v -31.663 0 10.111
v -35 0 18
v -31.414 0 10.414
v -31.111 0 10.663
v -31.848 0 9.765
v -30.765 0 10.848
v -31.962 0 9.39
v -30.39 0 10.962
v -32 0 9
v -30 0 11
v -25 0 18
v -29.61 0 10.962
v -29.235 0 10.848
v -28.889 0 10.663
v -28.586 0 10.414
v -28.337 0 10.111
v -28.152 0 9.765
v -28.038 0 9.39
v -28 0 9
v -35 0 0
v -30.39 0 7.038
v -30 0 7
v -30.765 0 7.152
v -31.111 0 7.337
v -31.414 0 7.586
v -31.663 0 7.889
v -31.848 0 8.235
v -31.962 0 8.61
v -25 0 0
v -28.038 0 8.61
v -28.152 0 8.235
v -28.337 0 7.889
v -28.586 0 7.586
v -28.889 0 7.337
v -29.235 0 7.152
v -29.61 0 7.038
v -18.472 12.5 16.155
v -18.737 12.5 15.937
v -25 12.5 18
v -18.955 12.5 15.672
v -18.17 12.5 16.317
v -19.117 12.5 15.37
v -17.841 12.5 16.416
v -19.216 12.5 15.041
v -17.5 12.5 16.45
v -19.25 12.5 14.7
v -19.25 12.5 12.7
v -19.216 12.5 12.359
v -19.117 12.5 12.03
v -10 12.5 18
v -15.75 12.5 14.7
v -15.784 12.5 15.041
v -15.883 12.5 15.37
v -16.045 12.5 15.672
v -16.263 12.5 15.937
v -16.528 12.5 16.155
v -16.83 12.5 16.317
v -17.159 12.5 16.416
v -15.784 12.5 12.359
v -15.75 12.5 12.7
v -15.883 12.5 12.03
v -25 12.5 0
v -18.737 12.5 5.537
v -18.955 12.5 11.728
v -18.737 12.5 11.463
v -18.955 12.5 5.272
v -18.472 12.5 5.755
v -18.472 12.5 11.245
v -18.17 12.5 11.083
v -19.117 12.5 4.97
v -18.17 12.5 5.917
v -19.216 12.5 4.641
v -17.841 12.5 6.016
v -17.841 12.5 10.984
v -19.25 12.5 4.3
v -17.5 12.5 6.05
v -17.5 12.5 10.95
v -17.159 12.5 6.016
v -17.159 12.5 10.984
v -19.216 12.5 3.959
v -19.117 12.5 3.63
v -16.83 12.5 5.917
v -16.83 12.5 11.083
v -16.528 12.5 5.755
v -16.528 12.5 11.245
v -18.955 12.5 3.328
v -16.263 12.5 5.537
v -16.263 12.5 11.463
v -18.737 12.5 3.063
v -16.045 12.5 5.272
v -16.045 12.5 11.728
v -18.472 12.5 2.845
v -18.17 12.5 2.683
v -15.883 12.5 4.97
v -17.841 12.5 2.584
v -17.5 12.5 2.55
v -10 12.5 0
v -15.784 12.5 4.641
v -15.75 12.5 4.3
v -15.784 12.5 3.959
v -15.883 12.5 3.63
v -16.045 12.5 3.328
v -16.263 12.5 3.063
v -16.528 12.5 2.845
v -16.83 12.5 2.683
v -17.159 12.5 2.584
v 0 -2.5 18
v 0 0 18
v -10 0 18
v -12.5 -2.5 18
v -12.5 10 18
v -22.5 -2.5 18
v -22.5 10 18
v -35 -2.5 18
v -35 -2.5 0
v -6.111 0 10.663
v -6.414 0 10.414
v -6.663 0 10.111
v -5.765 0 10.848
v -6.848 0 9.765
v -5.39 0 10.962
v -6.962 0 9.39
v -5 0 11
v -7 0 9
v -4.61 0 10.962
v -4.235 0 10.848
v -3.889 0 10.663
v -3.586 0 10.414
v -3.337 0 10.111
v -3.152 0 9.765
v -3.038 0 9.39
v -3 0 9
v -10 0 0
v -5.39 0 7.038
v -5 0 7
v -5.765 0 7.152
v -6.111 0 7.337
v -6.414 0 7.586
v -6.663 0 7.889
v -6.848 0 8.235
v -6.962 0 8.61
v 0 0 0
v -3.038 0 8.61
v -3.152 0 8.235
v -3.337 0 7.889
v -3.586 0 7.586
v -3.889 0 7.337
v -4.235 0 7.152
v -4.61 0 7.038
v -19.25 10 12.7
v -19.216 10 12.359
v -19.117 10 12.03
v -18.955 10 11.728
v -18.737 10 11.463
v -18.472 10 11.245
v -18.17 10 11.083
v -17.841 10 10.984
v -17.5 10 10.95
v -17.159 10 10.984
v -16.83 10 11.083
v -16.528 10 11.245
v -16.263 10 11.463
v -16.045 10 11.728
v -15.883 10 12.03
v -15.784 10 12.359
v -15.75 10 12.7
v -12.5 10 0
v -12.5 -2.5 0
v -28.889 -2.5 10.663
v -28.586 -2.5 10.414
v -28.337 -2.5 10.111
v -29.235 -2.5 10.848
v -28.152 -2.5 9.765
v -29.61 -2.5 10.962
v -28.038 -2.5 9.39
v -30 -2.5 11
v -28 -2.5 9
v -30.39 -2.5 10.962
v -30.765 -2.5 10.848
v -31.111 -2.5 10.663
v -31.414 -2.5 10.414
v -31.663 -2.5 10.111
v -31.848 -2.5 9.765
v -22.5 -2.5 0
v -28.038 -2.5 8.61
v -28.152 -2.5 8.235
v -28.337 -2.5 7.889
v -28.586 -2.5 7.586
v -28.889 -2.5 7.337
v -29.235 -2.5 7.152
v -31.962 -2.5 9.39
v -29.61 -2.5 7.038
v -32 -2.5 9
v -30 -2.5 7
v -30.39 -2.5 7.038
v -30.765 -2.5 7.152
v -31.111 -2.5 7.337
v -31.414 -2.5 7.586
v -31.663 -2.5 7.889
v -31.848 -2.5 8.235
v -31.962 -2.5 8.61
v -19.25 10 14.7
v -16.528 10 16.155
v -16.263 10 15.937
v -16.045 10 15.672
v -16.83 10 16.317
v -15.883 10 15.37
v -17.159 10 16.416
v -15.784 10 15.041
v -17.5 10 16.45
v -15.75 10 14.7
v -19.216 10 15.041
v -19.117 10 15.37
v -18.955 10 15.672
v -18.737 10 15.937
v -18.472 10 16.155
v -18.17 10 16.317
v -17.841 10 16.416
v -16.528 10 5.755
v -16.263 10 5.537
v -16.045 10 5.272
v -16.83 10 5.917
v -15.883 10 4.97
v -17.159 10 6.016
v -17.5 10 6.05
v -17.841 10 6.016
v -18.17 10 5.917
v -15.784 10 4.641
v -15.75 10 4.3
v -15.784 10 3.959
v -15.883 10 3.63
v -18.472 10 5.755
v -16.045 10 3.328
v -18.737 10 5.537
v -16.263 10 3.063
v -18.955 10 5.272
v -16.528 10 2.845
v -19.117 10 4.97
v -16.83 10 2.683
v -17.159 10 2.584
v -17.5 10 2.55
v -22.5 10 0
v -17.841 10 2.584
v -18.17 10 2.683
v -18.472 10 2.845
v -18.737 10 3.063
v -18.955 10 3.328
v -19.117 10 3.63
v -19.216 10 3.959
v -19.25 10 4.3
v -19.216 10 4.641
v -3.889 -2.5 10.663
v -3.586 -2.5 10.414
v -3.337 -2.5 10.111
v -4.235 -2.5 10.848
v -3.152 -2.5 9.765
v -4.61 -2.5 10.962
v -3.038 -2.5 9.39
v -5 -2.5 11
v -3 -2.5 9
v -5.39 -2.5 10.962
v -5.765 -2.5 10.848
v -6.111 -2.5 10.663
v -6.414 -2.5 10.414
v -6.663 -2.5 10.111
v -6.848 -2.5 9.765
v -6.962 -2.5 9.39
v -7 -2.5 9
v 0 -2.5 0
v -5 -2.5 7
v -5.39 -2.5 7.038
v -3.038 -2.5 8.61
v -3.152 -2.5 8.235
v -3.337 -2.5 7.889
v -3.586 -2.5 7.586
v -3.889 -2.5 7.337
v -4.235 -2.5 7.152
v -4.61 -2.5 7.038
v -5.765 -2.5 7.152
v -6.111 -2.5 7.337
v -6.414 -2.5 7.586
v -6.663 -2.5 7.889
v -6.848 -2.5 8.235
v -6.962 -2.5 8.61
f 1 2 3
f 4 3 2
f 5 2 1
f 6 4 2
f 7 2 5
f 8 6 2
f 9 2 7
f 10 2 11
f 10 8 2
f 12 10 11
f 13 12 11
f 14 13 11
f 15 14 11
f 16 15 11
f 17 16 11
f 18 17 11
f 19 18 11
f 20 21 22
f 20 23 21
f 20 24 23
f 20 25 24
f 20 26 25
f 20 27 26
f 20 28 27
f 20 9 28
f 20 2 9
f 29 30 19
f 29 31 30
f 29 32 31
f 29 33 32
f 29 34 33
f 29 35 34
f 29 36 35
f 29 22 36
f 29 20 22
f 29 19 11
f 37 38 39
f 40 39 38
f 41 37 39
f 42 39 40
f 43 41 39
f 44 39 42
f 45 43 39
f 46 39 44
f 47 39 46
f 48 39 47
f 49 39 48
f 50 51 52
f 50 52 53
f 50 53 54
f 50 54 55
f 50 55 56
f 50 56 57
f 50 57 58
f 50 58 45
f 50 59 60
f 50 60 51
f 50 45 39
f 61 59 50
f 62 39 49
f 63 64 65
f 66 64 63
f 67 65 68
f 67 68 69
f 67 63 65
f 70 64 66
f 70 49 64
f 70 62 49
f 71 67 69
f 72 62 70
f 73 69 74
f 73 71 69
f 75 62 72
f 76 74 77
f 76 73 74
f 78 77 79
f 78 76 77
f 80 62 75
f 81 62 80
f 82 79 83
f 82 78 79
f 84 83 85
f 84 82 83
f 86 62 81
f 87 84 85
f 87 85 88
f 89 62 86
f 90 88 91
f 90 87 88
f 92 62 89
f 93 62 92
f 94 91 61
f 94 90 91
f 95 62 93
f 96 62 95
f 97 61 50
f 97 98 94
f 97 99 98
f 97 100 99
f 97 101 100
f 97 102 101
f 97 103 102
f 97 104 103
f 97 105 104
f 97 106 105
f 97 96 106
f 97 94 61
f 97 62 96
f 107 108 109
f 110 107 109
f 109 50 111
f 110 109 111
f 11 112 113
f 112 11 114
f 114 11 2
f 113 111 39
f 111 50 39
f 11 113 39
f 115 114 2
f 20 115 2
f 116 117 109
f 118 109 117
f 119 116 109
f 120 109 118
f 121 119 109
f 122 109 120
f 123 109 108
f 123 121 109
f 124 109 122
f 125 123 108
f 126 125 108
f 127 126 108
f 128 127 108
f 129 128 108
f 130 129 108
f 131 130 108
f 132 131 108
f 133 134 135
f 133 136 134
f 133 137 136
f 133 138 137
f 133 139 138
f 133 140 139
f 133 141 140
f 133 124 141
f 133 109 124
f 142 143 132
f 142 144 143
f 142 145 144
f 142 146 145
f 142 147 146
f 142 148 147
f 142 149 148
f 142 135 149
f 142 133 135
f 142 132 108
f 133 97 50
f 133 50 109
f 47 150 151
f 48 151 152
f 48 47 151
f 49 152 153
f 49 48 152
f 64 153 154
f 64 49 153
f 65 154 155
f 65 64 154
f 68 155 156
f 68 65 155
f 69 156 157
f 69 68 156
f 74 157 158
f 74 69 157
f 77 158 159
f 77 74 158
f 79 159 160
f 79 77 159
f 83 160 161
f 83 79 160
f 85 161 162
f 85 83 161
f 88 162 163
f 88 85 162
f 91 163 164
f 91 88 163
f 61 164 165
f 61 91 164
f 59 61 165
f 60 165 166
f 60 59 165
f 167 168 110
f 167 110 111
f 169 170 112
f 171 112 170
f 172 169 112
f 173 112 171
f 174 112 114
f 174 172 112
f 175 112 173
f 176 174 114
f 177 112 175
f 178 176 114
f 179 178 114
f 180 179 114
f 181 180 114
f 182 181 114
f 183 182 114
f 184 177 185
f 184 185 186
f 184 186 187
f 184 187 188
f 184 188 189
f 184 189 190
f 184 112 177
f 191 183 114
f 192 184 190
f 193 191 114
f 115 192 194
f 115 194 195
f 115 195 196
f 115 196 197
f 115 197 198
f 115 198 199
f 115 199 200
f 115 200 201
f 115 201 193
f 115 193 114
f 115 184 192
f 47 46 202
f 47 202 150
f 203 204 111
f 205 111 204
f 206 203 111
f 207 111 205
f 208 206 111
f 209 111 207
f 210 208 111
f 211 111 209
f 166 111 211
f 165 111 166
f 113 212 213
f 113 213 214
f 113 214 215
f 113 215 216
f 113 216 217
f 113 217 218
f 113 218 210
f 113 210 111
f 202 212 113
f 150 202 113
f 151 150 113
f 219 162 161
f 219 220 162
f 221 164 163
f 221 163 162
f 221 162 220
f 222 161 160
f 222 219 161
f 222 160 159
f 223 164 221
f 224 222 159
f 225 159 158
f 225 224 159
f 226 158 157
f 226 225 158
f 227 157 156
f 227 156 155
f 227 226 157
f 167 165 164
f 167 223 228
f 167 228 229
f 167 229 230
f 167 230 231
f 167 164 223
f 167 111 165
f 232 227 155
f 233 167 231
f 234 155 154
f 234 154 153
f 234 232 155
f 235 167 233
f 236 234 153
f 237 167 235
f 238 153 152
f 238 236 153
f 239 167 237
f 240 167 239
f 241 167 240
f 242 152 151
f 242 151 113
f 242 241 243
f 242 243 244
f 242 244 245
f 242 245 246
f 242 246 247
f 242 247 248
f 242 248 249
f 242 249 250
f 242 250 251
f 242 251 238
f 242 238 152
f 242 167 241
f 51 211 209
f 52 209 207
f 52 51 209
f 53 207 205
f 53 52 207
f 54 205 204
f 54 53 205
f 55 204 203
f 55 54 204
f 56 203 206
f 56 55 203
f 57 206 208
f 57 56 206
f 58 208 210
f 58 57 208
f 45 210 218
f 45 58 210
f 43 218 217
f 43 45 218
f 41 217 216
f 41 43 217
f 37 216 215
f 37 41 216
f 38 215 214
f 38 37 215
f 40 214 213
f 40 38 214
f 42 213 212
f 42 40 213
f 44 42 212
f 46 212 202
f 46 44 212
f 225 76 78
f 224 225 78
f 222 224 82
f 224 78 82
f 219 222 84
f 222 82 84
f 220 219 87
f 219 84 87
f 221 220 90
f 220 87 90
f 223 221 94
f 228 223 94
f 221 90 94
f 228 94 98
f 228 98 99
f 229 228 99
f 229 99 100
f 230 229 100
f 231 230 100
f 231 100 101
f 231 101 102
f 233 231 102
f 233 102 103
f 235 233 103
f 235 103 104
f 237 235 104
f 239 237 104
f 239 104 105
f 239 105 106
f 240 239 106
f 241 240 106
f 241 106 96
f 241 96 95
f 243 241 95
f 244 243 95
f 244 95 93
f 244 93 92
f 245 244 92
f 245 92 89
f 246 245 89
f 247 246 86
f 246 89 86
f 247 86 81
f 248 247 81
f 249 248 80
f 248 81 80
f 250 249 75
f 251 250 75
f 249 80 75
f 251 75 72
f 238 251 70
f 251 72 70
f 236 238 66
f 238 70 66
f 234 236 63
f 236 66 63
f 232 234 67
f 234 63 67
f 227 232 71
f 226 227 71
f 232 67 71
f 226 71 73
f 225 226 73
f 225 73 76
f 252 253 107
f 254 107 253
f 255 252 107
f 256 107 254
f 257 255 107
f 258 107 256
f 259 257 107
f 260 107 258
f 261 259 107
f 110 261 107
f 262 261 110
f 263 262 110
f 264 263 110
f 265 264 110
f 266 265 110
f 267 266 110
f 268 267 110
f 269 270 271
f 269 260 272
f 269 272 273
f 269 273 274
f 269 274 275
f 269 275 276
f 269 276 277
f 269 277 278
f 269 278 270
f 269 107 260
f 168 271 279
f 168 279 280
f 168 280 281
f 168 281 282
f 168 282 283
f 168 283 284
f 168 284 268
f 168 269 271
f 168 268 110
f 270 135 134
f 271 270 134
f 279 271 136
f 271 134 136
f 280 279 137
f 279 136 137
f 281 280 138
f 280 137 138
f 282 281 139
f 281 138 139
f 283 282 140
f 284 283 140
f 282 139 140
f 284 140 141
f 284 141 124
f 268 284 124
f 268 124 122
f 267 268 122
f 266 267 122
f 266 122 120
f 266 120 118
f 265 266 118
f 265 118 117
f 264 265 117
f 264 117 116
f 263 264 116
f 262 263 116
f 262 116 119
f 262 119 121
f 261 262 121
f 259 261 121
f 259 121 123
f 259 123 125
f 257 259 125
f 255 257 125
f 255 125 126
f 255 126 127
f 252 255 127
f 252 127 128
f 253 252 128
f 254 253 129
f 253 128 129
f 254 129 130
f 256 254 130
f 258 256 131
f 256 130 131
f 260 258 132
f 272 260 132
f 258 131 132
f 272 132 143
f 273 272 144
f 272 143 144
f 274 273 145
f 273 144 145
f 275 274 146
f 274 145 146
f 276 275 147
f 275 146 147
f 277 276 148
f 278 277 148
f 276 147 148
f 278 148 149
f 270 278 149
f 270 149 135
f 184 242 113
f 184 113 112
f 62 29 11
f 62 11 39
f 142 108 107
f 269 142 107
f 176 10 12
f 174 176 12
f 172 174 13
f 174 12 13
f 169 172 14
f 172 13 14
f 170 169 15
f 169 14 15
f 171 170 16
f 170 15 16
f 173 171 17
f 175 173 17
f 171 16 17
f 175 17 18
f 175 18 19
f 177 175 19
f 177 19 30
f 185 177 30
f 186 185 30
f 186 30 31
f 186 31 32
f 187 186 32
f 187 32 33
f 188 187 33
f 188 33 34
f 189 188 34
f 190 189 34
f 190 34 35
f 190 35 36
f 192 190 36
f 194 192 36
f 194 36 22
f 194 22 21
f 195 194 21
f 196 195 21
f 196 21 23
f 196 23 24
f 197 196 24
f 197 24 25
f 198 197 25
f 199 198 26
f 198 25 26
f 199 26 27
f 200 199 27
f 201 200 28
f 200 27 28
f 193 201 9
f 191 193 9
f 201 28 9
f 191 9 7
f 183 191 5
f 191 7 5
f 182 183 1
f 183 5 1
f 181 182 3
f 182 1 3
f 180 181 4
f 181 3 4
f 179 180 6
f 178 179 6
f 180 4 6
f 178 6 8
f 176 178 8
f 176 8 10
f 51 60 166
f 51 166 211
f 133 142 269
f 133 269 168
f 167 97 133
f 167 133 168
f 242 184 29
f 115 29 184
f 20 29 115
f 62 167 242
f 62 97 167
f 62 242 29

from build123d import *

# Parameters (mm, degrees)
RESSALTO_EXTRUS_O1_DEPTH = 18
ESBO_O2_R                = 1.75
ESBO_O2_R_2              = 2
CORTE_EXTRUS_O1_DEPTH    = 43.118879377


with BuildPart() as part:
    # Esboço1 → Ressalto-extrusão1 (new body)
    with BuildSketch(Plane.XY):
        Polygon((-35, 0), (-25, 0), (-25, 12.5), (-10, 12.5), (-10, 0), (0, 0), (0, -2.5), (-12.5, -2.5), (-12.5, 10), (-22.5, 10), (-22.5, -2.5), (-35, -2.5), align=None)
    extrude(amount=RESSALTO_EXTRUS_O1_DEPTH)

    # Esboço2 → Corte-extrusão1 (cut, through all)
    with BuildSketch(Plane(origin=(0, 12.5, 0), x_dir=(1, 0, 0), z_dir=(0, 1, 0))):
        with Locations(Location((-17.5, -4.3, 0), (0, 0, 270))):
            Circle(ESBO_O2_R)
        with Locations(Location((-30, -9, 0), (0, 0, 270))):
            Circle(ESBO_O2_R_2)
        with Locations(Location((-5, -9, 0), (0, 0, 90))):
            Circle(ESBO_O2_R_2)
        with BuildLine():
            Line((-19.25, -14.7), (-19.25, -12.7))
            ThreePointArc((-19.25, -12.7), (-17.5, -10.95), (-15.75, -12.7))
            Line((-15.75, -12.7), (-15.75, -14.7))
            ThreePointArc((-15.75, -14.7), (-17.5, -16.45), (-19.25, -14.7))
        make_face()
    extrude(amount=-CORTE_EXTRUS_O1_DEPTH, mode=Mode.SUBTRACT)


solid = part.part
